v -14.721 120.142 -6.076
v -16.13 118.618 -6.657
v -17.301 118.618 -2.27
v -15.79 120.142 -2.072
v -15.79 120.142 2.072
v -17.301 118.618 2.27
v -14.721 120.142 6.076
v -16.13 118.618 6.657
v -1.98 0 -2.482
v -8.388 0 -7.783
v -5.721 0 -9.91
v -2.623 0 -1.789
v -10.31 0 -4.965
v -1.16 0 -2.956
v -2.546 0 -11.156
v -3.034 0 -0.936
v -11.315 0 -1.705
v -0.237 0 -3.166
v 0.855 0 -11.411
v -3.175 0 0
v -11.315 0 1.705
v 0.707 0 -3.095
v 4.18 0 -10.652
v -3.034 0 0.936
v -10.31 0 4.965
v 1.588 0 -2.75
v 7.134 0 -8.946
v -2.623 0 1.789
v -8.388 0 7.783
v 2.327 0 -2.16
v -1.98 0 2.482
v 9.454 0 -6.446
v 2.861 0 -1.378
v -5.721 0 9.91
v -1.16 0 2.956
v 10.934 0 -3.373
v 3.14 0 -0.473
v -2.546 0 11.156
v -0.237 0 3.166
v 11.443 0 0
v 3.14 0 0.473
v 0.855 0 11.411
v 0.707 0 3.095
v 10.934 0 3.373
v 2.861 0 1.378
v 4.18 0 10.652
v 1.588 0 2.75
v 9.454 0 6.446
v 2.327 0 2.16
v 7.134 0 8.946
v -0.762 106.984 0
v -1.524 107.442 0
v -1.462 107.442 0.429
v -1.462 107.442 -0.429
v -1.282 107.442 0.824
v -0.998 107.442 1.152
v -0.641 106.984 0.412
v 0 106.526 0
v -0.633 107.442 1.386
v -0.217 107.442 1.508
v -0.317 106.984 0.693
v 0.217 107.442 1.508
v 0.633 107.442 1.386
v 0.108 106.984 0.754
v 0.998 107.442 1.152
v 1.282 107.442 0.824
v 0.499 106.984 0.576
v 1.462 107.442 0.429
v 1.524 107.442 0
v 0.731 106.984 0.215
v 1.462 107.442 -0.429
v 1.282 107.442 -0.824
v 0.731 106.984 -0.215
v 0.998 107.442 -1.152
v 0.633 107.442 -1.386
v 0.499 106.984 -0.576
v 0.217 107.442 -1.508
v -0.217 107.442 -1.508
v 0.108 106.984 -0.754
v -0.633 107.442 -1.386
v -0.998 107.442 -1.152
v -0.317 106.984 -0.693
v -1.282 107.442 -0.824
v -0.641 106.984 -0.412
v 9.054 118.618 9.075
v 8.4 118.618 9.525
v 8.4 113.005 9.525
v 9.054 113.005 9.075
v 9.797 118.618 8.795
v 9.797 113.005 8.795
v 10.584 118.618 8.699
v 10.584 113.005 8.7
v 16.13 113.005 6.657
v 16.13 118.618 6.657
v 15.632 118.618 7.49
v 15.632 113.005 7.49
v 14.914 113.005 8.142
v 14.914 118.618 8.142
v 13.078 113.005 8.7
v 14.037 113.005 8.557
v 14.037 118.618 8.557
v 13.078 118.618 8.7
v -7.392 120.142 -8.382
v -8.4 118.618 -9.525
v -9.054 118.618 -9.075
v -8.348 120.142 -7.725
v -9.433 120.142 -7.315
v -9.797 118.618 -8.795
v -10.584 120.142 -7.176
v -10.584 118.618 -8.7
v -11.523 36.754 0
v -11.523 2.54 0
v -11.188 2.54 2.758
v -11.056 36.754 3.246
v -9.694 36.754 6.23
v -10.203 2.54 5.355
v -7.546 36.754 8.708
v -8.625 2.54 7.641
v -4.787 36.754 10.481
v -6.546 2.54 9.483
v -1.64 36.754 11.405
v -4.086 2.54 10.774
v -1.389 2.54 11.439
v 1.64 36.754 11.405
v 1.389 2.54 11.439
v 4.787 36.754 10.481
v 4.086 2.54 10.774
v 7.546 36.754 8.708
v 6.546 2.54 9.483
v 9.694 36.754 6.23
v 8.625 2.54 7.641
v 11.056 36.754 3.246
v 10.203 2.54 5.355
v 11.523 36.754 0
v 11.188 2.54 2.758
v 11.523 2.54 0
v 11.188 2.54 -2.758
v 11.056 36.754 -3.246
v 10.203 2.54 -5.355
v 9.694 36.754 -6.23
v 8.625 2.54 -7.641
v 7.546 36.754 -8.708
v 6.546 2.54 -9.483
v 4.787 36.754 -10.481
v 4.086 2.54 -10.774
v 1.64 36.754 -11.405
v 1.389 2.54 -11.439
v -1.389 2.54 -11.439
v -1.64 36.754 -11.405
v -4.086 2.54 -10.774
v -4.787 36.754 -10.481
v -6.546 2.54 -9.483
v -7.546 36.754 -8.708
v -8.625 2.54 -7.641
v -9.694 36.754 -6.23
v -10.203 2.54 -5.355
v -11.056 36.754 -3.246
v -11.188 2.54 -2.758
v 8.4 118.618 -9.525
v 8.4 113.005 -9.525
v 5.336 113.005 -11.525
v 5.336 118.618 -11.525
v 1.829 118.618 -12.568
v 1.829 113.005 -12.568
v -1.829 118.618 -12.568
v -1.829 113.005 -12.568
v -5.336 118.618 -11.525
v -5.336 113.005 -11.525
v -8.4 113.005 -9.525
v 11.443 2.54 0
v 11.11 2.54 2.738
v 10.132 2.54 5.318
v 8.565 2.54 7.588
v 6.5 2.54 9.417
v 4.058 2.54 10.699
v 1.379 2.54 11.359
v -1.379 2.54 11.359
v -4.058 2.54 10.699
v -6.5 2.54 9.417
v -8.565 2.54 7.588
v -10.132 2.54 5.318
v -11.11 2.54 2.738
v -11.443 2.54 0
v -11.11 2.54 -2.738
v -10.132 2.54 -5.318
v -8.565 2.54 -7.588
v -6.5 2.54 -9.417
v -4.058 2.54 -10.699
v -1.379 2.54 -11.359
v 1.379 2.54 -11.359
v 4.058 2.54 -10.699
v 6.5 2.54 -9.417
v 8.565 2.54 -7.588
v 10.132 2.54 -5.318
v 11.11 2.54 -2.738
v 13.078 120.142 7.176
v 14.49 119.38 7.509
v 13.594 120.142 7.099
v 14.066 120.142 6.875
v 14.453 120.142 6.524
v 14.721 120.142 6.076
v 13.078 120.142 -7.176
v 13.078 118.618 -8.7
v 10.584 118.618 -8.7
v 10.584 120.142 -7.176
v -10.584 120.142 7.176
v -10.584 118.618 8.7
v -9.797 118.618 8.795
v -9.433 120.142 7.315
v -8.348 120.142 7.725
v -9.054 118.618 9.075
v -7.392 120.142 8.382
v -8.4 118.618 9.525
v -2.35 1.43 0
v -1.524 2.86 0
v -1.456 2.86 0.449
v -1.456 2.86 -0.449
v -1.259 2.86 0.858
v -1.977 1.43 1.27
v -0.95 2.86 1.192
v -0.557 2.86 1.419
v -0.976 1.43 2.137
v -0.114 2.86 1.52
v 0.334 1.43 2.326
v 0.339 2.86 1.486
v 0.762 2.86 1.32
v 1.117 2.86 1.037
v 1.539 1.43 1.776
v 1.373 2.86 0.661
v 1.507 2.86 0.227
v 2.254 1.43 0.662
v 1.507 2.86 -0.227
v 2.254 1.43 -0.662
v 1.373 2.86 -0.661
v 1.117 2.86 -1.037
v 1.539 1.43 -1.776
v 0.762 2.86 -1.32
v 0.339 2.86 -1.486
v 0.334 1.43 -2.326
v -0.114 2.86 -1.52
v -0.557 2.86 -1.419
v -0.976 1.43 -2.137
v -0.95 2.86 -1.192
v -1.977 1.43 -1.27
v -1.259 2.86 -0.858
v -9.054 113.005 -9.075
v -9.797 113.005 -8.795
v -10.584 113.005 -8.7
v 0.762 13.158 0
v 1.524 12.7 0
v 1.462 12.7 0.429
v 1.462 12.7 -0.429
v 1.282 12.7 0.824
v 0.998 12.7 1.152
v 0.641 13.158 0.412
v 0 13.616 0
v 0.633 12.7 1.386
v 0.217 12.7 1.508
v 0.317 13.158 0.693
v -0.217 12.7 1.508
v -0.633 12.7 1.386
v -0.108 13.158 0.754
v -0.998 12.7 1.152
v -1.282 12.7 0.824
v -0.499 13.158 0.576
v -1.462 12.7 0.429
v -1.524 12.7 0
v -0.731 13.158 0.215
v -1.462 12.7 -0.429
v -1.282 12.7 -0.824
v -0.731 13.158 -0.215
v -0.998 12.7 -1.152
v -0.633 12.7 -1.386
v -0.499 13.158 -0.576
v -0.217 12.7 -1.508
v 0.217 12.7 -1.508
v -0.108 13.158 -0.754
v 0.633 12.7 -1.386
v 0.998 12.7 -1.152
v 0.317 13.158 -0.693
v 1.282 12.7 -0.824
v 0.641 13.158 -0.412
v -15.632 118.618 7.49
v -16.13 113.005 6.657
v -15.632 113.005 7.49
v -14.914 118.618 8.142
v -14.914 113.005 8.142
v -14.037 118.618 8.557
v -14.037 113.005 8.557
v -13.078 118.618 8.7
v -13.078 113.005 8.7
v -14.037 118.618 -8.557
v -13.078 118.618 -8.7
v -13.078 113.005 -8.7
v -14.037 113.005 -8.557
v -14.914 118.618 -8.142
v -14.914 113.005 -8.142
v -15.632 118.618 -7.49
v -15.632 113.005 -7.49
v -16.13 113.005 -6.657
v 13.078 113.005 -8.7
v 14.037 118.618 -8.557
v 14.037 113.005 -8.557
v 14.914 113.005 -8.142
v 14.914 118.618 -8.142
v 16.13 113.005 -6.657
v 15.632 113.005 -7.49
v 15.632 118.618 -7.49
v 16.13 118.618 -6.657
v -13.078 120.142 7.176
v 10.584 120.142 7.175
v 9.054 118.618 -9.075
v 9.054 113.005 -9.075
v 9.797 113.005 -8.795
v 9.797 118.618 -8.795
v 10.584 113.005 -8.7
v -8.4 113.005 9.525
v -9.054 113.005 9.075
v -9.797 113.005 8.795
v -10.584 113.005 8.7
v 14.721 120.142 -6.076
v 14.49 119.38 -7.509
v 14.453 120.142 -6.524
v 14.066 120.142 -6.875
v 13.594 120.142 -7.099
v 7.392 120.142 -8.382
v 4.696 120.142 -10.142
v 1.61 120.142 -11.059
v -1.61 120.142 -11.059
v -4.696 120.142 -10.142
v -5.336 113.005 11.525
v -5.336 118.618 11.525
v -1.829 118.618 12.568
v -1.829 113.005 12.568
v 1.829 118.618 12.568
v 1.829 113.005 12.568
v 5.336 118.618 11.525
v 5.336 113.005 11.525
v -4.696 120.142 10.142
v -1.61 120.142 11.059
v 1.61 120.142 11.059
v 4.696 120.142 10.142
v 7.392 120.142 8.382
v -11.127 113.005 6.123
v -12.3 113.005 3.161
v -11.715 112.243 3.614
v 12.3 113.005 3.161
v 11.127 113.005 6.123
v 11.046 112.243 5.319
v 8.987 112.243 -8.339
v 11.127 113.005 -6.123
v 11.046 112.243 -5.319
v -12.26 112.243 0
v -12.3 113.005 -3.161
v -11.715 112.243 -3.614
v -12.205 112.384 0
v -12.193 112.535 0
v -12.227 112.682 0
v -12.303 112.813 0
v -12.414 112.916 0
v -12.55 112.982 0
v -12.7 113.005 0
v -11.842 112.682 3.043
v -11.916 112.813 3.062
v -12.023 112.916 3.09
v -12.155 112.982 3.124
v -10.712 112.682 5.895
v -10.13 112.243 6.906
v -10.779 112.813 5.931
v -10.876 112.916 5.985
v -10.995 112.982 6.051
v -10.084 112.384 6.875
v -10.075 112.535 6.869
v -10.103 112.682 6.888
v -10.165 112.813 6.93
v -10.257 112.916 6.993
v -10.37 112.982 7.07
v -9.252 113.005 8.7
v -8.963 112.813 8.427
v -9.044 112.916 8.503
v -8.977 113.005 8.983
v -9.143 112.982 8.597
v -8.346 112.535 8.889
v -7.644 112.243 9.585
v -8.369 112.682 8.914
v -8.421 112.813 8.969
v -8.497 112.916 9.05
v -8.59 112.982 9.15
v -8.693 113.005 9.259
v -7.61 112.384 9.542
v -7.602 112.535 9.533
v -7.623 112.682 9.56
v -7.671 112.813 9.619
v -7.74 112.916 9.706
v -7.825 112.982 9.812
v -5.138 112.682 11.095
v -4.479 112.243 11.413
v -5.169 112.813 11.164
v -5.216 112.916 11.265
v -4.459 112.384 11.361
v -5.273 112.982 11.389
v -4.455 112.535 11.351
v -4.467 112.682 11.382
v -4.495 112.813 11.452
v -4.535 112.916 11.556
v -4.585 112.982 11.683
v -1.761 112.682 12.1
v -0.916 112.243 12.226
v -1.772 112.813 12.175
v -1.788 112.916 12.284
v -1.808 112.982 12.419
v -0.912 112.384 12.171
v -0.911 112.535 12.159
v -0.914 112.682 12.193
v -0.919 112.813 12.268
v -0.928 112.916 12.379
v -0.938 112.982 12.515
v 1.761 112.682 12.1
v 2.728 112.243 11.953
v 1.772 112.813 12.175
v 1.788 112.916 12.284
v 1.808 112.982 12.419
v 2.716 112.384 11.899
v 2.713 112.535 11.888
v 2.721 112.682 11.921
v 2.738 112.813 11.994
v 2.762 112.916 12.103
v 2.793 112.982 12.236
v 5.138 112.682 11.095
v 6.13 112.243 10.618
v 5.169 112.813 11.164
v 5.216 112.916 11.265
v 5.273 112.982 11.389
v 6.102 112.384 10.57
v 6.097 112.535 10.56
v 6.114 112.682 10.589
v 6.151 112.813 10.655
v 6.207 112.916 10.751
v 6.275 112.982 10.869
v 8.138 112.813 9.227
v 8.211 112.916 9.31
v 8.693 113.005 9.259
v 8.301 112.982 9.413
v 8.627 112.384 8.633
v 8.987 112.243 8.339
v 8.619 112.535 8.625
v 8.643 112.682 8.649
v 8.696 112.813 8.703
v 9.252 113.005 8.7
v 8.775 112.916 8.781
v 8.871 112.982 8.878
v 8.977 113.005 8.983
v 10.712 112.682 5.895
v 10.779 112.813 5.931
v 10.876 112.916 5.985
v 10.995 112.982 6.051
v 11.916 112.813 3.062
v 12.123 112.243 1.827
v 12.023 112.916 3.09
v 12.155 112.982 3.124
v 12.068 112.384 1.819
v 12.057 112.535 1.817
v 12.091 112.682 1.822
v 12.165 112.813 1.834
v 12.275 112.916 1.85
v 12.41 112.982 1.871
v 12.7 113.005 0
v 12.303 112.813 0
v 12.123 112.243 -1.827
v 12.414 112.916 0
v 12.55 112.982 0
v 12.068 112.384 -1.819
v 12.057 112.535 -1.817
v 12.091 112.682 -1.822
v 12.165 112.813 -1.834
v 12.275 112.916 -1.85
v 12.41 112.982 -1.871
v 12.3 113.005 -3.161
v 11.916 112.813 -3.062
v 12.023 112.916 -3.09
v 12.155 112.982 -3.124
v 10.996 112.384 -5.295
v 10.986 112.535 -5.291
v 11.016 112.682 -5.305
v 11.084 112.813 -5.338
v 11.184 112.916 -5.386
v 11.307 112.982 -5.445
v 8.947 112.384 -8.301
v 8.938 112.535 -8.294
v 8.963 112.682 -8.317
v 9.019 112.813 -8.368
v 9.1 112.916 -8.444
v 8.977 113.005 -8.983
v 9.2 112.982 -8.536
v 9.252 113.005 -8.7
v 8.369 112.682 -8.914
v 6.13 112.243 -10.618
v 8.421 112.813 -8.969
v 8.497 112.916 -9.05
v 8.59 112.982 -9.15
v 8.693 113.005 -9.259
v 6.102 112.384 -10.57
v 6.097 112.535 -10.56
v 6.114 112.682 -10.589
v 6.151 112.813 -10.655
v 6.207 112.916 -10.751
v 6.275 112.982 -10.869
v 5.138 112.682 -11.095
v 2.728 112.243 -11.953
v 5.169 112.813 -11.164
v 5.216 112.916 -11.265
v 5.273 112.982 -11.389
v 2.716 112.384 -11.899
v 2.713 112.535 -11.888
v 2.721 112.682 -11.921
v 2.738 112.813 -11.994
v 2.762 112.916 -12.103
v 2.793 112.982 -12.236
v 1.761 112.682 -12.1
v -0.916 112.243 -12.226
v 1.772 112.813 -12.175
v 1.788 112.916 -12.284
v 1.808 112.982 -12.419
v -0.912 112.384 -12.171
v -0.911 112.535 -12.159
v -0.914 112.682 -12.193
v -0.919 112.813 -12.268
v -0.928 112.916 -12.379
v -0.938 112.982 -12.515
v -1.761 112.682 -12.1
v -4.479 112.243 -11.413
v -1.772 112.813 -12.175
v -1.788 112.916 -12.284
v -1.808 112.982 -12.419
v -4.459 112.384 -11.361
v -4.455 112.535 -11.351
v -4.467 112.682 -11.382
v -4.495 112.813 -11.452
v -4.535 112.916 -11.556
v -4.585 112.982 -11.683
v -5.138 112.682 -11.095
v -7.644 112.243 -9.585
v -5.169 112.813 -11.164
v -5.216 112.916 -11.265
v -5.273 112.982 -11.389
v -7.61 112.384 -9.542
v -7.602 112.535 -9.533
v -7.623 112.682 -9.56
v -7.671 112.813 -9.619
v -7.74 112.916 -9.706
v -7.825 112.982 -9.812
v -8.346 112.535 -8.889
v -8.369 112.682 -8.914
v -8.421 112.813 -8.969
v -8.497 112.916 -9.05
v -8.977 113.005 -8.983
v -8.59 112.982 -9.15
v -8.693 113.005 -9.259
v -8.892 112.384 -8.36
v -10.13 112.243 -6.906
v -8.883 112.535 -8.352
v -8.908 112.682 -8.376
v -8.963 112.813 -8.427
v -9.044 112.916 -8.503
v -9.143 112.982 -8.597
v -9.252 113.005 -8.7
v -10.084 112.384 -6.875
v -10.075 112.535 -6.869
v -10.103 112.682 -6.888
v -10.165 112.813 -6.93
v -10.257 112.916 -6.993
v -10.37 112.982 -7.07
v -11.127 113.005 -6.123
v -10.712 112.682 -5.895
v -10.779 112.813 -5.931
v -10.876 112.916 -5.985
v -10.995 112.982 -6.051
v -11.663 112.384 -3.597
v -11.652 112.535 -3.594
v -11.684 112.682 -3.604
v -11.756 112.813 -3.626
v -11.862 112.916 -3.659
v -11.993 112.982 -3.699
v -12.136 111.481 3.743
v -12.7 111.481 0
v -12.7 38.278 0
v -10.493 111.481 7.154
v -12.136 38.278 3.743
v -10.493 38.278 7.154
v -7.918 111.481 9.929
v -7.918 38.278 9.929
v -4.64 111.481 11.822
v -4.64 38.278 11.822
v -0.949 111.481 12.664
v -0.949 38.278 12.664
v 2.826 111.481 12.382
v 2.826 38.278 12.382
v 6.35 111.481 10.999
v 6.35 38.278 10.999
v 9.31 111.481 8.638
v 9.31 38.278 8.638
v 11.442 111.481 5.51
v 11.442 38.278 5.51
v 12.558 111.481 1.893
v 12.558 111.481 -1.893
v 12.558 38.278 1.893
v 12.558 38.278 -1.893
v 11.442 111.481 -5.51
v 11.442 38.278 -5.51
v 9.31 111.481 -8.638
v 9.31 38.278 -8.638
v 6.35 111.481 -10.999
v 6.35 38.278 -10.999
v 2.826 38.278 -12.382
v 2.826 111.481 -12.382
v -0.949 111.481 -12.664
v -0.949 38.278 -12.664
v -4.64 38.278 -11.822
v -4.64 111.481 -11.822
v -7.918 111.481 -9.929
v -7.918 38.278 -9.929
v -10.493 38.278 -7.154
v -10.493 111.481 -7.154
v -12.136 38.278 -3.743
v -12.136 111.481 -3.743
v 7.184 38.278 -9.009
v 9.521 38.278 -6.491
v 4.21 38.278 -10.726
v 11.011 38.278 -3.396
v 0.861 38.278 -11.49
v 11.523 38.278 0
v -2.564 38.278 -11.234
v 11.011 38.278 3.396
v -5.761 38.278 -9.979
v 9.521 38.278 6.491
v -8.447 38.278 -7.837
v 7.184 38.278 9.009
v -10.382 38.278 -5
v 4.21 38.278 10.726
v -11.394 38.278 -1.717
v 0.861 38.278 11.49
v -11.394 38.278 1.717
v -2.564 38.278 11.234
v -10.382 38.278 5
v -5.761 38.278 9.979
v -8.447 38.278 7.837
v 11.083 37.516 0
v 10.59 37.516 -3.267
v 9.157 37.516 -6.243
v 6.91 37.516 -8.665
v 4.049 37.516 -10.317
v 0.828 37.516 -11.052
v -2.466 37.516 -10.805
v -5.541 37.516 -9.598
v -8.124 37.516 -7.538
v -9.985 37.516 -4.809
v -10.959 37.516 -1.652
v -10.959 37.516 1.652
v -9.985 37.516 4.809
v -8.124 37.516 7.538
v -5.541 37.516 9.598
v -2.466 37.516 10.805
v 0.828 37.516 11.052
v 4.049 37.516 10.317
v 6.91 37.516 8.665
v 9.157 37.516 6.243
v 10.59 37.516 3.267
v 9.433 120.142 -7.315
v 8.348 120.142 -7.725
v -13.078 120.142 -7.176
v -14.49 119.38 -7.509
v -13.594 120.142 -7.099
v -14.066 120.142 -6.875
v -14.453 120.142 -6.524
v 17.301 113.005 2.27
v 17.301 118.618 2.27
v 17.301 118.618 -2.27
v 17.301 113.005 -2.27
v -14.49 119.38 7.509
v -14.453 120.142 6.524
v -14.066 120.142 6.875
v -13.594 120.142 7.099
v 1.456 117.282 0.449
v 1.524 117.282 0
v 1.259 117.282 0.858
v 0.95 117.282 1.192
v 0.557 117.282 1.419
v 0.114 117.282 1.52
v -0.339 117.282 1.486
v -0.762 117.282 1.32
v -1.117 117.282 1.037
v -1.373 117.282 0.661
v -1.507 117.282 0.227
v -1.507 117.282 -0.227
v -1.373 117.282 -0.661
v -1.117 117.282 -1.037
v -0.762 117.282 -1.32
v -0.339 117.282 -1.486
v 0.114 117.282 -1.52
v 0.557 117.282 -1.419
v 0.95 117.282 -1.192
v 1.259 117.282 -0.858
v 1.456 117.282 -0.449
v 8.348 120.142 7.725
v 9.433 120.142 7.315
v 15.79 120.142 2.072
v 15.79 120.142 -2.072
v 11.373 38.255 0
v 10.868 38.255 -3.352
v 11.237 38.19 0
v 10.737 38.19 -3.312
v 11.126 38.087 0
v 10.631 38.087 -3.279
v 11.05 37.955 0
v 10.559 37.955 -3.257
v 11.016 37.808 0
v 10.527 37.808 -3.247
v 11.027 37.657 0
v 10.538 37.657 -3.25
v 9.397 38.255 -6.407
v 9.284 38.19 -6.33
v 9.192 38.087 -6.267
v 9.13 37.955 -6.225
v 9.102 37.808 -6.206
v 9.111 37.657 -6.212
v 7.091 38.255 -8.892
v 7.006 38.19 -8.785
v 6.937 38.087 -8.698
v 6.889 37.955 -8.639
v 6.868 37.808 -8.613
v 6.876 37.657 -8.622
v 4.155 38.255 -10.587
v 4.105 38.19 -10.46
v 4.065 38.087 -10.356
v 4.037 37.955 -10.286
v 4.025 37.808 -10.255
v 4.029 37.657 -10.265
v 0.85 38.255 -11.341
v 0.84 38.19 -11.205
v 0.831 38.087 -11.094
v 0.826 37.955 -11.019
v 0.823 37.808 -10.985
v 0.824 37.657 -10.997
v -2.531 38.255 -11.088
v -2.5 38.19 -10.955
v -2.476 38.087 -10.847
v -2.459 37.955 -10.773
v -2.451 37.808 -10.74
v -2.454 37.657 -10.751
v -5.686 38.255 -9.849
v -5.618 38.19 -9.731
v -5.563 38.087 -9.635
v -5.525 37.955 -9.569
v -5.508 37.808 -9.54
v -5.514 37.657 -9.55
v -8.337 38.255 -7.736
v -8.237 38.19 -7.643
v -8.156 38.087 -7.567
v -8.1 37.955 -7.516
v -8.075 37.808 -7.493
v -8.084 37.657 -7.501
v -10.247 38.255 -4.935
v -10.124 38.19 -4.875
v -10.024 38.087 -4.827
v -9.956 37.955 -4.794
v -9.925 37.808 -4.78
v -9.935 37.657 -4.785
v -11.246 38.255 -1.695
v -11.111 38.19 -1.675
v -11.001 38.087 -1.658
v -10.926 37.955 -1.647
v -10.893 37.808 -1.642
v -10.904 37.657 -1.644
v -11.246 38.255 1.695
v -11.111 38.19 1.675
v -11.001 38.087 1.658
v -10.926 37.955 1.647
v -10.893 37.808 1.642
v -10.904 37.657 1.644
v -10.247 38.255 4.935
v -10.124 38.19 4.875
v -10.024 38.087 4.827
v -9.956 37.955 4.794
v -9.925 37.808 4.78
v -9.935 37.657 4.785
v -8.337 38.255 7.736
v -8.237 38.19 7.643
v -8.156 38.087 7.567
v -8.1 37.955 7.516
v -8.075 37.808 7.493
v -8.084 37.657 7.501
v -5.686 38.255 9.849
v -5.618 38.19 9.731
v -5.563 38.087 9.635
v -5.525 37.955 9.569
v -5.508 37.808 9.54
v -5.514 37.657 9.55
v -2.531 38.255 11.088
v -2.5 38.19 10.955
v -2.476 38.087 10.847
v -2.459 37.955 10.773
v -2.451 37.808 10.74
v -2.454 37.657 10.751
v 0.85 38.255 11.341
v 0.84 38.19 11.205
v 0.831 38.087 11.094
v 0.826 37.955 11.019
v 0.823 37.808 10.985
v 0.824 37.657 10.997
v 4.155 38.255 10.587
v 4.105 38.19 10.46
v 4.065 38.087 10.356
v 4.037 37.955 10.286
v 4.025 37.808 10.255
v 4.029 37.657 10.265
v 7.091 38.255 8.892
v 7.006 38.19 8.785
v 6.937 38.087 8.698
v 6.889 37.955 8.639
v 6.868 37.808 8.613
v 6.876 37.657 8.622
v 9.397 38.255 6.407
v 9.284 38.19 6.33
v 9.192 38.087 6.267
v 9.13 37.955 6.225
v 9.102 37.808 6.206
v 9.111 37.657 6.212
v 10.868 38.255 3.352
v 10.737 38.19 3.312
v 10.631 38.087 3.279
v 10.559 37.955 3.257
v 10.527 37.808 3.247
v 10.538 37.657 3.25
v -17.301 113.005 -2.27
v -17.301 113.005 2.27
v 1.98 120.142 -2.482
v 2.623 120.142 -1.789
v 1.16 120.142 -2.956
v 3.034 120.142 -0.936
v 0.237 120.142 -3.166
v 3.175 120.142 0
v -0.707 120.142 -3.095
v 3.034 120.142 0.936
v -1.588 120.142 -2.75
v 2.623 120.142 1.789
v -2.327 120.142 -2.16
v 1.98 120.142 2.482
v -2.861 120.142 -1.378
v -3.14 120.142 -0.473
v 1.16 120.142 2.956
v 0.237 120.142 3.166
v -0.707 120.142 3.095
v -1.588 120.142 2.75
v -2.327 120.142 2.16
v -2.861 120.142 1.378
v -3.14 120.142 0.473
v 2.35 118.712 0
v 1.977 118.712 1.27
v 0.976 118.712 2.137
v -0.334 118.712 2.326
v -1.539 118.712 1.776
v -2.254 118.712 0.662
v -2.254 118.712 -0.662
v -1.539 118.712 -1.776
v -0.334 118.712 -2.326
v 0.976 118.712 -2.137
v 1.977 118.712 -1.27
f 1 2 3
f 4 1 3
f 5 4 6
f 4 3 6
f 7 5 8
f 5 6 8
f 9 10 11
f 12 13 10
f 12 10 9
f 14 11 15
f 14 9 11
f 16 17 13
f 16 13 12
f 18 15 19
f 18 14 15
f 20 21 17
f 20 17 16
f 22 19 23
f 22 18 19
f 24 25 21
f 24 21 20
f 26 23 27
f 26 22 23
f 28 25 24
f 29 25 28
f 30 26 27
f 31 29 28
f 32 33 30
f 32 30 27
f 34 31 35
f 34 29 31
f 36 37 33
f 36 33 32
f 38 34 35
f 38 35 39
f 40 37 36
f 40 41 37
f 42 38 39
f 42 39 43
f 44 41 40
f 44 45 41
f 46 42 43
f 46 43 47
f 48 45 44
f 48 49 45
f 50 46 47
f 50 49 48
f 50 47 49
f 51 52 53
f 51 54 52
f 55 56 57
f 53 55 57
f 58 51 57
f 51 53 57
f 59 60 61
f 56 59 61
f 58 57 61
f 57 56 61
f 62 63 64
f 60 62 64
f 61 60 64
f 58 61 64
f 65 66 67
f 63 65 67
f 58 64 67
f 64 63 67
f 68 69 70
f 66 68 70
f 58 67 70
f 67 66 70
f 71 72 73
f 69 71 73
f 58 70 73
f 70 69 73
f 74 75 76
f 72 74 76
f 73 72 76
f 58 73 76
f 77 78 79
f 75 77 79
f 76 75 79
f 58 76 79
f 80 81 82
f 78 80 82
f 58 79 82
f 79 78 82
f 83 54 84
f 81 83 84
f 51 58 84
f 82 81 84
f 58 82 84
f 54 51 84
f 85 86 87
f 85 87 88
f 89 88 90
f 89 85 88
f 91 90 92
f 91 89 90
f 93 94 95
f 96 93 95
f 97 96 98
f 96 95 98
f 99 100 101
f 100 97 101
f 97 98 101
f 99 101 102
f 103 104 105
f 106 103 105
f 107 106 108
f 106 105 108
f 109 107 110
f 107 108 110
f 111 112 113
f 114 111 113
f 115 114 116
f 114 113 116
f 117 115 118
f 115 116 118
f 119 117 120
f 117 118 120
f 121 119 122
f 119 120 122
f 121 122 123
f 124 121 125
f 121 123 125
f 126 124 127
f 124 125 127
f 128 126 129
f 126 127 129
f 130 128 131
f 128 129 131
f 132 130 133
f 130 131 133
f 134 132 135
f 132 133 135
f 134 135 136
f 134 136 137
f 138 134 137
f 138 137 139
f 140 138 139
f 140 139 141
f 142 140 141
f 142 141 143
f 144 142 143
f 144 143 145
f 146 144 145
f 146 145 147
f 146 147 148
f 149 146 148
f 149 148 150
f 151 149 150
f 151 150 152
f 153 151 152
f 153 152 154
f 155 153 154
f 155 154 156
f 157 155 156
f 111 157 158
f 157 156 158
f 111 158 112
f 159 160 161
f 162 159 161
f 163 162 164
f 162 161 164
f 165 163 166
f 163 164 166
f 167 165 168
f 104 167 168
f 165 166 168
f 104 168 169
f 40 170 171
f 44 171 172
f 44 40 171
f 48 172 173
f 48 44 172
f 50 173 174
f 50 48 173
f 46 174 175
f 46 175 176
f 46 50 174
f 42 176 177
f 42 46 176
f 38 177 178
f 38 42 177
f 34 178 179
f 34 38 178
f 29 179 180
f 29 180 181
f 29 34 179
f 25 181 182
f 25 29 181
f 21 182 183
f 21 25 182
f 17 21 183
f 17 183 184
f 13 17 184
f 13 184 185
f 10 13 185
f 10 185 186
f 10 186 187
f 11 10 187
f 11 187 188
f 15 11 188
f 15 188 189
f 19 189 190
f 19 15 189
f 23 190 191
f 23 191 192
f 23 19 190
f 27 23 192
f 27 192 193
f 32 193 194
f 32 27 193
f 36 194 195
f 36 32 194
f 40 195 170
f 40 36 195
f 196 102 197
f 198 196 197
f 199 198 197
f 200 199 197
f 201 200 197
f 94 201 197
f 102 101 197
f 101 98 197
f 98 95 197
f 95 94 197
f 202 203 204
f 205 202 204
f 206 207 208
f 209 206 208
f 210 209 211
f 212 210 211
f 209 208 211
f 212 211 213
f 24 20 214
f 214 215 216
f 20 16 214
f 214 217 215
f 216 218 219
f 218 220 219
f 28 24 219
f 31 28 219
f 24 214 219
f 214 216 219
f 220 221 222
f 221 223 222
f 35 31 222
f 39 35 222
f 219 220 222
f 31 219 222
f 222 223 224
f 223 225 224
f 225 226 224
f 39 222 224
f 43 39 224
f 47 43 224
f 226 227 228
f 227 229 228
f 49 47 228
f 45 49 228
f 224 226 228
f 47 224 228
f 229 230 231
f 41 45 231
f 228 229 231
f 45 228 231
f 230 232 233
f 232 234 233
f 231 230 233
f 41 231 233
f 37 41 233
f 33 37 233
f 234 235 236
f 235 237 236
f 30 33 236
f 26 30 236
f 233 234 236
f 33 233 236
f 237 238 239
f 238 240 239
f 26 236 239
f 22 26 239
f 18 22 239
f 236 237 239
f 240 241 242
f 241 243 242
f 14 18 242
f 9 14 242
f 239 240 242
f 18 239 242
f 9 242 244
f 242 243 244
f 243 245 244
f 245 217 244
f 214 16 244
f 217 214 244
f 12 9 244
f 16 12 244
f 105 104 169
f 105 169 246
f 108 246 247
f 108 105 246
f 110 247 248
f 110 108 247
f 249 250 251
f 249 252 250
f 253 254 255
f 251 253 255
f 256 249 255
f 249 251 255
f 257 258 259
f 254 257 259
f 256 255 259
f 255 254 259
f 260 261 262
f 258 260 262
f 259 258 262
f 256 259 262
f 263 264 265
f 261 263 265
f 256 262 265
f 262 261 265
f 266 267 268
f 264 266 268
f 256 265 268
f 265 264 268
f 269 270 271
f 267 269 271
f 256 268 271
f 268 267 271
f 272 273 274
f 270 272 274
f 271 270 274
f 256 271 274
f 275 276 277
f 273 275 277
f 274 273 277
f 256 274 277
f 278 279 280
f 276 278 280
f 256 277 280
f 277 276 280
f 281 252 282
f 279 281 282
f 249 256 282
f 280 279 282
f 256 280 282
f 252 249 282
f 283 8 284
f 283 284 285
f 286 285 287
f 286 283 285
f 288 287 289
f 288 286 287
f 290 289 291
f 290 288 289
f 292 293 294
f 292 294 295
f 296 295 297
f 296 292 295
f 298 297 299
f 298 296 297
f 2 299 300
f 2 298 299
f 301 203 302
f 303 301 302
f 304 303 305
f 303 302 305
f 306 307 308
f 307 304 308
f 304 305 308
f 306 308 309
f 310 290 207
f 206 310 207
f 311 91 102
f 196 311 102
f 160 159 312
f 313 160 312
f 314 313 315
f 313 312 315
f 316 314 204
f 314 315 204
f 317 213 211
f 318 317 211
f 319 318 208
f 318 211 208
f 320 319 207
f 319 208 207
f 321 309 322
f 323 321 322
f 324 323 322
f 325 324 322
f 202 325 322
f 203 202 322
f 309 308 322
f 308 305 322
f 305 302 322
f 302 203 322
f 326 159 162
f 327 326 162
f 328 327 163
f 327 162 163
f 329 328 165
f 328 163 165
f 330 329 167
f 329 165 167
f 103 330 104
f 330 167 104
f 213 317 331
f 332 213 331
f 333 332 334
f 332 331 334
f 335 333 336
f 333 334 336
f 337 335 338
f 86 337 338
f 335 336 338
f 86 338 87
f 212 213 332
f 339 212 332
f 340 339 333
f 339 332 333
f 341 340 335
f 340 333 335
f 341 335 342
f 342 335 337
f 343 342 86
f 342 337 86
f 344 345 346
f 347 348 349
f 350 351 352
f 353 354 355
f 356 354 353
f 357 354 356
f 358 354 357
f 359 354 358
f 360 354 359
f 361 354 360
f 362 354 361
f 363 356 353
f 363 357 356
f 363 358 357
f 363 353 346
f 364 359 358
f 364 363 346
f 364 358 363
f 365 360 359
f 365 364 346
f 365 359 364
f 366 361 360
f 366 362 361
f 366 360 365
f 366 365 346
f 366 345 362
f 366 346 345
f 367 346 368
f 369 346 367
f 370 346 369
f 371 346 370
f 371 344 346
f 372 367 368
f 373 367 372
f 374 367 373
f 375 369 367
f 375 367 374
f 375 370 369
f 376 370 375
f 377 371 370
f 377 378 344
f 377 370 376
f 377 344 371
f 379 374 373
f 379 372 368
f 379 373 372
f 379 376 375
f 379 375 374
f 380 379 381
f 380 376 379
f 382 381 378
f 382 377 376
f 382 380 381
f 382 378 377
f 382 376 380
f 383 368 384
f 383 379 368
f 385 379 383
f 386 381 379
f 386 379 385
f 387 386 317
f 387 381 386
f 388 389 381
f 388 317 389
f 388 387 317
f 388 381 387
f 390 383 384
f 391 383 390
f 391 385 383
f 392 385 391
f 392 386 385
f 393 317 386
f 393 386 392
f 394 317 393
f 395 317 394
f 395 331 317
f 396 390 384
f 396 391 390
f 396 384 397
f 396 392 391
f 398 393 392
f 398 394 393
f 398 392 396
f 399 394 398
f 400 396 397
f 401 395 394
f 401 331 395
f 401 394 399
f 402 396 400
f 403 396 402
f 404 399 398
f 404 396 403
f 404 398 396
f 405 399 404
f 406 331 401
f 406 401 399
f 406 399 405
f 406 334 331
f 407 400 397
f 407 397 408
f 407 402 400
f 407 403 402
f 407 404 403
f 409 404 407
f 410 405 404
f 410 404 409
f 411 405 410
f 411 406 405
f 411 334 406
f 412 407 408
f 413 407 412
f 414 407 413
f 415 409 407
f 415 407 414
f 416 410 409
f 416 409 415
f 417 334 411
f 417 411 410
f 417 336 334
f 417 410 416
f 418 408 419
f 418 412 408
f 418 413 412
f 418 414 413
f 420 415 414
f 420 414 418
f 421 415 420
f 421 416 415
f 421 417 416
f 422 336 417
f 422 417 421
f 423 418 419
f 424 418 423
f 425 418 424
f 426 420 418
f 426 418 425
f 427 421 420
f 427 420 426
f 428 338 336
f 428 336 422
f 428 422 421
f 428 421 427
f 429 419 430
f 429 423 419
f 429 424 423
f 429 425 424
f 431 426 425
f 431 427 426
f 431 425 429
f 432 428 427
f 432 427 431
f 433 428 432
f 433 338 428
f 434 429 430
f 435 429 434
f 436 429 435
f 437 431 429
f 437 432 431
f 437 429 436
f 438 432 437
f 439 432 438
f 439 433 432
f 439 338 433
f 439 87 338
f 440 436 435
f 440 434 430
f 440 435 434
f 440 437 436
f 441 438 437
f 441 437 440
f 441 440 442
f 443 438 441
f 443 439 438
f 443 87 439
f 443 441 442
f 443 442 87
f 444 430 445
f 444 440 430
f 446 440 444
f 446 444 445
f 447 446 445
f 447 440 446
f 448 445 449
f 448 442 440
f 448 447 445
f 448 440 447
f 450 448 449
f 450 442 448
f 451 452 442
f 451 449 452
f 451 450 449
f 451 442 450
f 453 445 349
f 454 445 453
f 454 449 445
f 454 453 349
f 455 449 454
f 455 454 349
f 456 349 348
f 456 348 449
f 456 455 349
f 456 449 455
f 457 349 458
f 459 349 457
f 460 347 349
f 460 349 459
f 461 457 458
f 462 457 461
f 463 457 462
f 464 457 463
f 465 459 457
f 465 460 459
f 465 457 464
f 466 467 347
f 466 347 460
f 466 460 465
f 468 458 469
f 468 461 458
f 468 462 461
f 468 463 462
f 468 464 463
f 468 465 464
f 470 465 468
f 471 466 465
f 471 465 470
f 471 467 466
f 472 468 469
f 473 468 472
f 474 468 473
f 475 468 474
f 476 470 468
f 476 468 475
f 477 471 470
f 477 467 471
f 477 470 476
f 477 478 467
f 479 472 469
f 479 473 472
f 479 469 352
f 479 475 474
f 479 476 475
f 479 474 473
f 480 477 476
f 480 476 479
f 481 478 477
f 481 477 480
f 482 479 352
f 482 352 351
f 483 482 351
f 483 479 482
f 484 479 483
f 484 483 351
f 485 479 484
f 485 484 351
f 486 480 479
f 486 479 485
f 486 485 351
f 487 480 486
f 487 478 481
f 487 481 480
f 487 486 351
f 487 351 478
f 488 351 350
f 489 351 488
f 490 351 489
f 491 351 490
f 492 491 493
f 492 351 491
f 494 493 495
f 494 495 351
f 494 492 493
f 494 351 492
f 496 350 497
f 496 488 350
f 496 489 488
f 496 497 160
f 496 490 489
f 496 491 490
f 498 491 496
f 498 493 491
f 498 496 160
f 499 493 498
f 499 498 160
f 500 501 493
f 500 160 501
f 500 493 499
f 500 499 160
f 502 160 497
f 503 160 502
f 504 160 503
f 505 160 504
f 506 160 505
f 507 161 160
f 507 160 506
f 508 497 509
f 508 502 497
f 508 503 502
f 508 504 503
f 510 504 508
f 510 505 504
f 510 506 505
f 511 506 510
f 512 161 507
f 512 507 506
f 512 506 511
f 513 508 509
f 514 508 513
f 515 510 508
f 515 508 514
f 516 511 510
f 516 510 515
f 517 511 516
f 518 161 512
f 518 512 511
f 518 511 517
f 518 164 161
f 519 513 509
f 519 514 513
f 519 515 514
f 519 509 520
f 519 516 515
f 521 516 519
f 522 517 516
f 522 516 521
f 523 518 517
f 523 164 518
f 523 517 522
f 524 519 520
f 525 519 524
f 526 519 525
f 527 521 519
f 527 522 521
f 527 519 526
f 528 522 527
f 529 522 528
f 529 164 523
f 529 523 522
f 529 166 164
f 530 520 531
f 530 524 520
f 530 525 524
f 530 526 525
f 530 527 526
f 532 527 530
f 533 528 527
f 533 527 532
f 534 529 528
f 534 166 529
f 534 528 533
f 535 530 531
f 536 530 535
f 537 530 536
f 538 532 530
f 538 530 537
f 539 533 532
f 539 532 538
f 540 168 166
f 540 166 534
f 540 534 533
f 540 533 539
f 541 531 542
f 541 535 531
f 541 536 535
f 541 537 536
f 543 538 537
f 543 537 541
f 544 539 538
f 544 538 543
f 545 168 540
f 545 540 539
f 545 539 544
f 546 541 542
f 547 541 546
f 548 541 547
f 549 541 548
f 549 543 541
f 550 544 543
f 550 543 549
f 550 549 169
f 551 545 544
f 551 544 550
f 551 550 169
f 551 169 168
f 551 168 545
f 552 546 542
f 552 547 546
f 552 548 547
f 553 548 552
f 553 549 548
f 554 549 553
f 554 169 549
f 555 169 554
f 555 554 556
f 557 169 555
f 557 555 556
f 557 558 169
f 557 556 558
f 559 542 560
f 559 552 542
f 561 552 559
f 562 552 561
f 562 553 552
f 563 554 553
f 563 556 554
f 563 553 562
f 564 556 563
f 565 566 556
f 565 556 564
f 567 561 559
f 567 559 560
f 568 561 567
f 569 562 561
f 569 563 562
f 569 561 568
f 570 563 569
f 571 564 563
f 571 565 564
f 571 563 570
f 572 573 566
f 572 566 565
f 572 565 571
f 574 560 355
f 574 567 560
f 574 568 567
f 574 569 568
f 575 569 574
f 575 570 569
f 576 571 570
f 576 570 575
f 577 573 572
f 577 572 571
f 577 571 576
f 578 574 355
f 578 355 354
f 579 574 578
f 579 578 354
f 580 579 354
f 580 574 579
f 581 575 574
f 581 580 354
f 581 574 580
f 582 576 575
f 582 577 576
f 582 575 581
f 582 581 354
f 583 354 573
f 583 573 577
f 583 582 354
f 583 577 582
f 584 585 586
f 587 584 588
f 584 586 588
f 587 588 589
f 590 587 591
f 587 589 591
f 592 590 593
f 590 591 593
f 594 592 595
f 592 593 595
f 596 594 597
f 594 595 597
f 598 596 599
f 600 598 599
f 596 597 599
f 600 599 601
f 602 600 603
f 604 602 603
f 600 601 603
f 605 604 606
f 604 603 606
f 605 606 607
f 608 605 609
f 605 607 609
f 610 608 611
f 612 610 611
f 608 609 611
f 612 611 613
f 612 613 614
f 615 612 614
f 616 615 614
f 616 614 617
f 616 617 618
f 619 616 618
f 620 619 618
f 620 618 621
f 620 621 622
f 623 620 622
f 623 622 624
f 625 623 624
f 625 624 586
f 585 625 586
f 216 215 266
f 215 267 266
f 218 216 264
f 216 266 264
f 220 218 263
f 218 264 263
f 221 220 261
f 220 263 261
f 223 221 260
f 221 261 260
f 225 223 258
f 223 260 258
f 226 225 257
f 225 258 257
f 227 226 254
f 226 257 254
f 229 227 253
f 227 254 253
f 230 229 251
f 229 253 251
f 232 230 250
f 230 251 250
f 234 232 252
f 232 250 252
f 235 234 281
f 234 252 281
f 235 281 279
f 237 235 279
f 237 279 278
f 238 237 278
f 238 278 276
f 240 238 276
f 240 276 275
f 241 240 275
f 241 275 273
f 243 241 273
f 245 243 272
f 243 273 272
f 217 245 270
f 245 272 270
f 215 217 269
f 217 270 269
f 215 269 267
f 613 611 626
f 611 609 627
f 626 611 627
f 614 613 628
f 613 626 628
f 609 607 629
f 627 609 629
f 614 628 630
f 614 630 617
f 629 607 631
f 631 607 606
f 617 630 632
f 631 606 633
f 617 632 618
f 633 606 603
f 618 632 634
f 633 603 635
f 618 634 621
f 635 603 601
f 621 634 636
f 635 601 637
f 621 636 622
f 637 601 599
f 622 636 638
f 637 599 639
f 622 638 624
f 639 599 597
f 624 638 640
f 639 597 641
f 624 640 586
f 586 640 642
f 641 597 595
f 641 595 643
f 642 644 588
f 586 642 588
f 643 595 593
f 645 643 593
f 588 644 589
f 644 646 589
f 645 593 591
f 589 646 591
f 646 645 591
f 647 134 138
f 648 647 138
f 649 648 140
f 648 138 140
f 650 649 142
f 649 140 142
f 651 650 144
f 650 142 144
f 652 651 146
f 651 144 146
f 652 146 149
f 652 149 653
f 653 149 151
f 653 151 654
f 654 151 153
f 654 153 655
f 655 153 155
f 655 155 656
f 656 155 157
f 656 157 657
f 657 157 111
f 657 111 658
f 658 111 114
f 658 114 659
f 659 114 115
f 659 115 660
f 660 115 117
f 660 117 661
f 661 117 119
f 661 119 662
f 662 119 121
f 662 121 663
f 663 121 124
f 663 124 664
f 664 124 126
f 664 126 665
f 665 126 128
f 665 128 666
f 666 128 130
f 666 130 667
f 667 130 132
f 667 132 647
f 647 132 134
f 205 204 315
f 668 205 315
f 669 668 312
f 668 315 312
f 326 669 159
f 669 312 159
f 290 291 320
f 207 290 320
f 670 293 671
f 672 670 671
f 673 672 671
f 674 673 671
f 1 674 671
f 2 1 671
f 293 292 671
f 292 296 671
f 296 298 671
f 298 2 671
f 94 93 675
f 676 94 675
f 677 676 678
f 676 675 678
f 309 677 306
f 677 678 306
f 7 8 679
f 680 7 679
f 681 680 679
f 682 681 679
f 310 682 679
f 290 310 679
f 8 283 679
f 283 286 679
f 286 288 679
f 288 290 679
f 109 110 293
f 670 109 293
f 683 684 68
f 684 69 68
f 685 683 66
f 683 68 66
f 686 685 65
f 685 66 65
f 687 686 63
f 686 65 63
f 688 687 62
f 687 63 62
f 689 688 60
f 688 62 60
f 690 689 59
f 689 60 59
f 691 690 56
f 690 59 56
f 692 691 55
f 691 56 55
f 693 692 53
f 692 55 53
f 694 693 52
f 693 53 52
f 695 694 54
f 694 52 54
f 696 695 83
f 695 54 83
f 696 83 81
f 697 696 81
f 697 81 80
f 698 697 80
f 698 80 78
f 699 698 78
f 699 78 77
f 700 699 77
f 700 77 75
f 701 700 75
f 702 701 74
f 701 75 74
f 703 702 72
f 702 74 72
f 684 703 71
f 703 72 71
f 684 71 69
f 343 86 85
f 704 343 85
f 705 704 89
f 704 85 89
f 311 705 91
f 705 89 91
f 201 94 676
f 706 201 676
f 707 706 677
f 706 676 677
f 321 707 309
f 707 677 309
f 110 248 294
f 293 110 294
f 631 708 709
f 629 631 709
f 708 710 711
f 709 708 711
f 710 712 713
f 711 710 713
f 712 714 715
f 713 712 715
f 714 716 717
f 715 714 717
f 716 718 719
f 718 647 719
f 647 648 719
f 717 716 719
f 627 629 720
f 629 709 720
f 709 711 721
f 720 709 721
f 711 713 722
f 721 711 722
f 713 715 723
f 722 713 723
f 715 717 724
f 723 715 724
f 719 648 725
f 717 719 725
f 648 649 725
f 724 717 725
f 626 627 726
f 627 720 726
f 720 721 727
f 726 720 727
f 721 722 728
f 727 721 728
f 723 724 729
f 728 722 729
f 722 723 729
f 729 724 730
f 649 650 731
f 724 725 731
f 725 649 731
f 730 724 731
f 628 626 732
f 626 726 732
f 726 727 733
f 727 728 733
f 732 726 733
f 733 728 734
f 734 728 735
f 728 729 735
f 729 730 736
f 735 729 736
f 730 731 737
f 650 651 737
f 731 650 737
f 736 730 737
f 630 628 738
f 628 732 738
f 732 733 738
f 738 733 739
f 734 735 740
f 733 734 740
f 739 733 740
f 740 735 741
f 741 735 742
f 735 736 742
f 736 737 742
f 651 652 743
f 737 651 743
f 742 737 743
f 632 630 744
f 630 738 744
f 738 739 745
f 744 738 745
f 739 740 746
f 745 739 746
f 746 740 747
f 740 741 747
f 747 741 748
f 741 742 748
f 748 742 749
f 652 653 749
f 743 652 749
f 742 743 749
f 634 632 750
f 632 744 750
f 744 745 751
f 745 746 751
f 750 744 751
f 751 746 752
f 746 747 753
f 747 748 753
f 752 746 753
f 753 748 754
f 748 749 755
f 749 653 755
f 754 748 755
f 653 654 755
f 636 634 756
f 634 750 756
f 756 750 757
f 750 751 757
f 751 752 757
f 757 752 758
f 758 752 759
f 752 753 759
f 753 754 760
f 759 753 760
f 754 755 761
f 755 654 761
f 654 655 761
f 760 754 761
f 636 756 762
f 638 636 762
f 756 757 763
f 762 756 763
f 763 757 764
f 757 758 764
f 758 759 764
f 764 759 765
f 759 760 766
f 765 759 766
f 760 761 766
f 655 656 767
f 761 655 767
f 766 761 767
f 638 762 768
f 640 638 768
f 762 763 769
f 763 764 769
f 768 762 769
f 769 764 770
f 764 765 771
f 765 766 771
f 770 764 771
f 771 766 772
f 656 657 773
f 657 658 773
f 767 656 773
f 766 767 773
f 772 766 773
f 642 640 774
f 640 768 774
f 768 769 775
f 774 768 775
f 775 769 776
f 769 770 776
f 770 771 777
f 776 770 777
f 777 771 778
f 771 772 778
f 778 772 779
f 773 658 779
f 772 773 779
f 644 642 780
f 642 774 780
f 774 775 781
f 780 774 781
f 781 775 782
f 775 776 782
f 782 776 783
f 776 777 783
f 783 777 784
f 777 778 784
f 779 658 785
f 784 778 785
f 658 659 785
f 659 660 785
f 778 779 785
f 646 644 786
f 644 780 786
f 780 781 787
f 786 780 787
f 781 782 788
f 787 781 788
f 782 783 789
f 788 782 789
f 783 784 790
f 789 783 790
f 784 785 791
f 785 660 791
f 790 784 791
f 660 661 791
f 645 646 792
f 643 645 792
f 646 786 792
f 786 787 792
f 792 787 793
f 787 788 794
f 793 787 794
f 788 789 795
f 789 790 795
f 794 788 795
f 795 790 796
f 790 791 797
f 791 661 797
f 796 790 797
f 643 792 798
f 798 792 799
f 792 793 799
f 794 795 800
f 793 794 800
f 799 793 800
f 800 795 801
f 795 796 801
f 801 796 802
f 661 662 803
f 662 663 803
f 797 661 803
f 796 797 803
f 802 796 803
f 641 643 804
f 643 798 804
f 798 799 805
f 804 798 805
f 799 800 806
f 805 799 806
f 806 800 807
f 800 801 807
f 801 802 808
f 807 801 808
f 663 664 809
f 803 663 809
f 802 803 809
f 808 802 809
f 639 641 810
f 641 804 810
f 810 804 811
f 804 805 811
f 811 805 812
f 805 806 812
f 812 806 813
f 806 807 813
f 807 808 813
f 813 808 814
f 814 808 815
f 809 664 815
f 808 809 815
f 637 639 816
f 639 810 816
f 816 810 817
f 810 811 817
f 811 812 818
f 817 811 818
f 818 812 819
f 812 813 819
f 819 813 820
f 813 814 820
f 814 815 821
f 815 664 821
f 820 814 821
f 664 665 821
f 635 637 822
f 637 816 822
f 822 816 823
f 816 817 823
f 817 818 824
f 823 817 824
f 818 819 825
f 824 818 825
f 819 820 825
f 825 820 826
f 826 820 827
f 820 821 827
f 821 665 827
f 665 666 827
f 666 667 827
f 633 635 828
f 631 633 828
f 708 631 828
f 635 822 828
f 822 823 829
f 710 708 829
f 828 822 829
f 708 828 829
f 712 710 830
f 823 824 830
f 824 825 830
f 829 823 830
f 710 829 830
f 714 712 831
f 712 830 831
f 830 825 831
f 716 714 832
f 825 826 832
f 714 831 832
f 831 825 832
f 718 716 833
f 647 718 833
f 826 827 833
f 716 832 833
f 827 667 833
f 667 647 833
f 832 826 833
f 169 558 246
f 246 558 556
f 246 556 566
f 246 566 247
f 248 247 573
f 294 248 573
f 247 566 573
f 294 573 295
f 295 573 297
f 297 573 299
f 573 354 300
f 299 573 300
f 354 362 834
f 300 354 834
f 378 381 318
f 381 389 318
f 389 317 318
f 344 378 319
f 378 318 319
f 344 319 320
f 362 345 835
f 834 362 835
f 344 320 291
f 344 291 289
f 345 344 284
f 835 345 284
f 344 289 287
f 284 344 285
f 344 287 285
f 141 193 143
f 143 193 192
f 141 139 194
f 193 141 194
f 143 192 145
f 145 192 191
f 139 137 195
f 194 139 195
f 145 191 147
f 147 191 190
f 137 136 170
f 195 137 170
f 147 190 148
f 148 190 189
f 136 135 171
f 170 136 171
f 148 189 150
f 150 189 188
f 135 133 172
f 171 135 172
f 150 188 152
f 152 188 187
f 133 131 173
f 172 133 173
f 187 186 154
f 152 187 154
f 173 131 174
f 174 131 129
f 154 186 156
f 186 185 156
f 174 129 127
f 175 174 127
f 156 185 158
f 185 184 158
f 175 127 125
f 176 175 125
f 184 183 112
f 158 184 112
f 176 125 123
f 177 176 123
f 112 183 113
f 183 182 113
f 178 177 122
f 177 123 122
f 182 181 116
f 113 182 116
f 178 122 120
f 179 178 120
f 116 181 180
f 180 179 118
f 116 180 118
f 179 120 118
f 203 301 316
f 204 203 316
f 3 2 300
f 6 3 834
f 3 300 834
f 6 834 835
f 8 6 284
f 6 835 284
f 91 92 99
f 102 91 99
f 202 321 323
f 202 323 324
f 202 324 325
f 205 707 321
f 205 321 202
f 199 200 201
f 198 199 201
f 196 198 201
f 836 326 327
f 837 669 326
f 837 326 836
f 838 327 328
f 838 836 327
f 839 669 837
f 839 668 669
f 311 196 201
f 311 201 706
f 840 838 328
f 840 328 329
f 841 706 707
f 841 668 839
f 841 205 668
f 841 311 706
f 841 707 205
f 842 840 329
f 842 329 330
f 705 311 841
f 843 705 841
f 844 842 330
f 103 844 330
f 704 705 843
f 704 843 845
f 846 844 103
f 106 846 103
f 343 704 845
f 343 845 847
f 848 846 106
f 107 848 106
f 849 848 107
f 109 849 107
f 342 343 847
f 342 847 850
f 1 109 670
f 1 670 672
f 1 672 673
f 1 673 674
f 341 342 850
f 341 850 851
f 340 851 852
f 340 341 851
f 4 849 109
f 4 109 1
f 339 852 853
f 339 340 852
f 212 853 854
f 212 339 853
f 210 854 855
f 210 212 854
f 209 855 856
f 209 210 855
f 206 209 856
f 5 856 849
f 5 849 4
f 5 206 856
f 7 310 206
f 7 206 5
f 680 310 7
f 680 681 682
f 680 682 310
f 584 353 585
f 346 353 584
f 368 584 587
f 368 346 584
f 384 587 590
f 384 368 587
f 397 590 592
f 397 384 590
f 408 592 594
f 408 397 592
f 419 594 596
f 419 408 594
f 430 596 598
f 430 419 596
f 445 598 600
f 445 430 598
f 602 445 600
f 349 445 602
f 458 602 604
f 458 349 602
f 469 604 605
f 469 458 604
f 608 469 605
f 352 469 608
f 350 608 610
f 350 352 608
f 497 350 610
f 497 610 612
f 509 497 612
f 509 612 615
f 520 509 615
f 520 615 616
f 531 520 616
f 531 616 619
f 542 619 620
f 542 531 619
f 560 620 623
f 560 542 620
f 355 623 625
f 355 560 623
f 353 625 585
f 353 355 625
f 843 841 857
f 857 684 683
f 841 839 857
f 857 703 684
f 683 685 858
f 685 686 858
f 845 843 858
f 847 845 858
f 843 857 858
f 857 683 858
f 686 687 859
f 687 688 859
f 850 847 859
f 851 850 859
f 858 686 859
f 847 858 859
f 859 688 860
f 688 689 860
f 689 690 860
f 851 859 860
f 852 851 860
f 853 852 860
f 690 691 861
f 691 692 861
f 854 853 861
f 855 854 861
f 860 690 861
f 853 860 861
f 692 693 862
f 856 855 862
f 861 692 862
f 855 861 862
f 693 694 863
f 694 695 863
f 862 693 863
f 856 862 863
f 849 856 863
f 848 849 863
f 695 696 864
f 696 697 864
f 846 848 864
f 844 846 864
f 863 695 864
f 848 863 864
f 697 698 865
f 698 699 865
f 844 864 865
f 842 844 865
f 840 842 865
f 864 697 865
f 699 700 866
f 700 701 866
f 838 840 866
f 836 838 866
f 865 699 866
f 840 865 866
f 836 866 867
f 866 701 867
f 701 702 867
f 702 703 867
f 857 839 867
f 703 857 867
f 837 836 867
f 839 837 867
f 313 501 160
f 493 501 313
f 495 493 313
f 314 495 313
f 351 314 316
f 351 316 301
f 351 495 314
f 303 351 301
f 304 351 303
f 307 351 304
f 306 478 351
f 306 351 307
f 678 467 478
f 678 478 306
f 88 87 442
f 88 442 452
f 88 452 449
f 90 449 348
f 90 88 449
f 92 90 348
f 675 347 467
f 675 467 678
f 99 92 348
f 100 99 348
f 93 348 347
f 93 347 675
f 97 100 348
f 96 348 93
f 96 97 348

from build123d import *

# Parameters (mm, degrees)
F0_R            = 11.4427
F1_DEPTH        = 2.54
F2_R            = 11.52271
F3_DEPTH        = 35.7378
F4_R            = 12.7
F4_R_2          = 11.52271
F5_DEPTH        = 74.7268
F7_DEPTH        = 7.1374
F8_T1_DEPTH     = 7.1374
F8_T3_DEPTH     = 18.5145836873
F9_SIZE         = 1.524
F13_D           = 3.048
F13_DEPTH       = 12.7
F13_CSINK_D     = 6.35
F13_CSINK_ANGLE = 60
F13_TIP         = 0.9157115834
F15_D           = 3.048
F15_DEPTH       = 12.7
F15_CSINK_D     = 6.35
F15_CSINK_ANGLE = 60
F15_TIP         = 0.9157115834


# Not quite as in the source:
# - a fillet or chamfer that OpenCascade refuses, or shapes differently, is made with other operations: its cross-section is extruded or revolved along the edge and cut away or added


with BuildPart() as f1:
    # F0 (on Front) → F1 (new body)
    with BuildSketch(Plane.XZ):
        Circle(F0_R)
    extrude(amount=-F1_DEPTH)

    # F2 (on face) → F3 (join)
    with BuildSketch(Plane(origin=(0, 2.54, 0), x_dir=(-1, 0, 0), z_dir=(0, 1, 0))):
        Circle(F2_R)
    extrude(amount=F3_DEPTH)

    # F4 (on face) → F5 (join)
    with BuildSketch(Plane(origin=(0, 38.2778, 0), x_dir=(-1, 0, 0), z_dir=(0, 1, 0))):
        Circle(F4_R)
        Circle(F4_R_2, mode=Mode.SUBTRACT)
        Circle(F4_R_2)
    extrude(amount=F5_DEPTH)

    # F6 (on face) → F7 (join)
    with BuildSketch(Plane(origin=(0, 113.0046, 0), x_dir=(-1, 0, 0), z_dir=(0, 1, 0))):
        with BuildLine():
            ThreePointArc((12.7, 0), (11.8067080769, 4.678850755), (9.2524969468, 8.6995))
            ThreePointArc((9.2524969468, 8.6995), (0, 12.7), (-9.2524969468, 8.6995))
            ThreePointArc((-9.2524969468, 8.6995), (-12.7, 0), (-9.2524969468, -8.6995))
            ThreePointArc((-9.2524969468, -8.6995), (0, -12.7), (9.2524969468, -8.6995))
            ThreePointArc((9.2524969468, -8.6995), (11.8067080769, -4.678850755), (12.7, 0))
        make_face()
        with BuildLine():
            ThreePointArc((15.126606354, -8.6995), (17.4498, 0), (15.126606354, 8.6995))
            Line((15.126606354, 8.6995), (9.2524969468, 8.6995))
            ThreePointArc((9.2524969468, 8.6995), (11.8067080769, 4.678850755), (12.7, 0))
            ThreePointArc((12.7, 0), (11.8067080769, -4.678850755), (9.2524969468, -8.6995))
            Line((9.2524969468, -8.6995), (15.126606354, -8.6995))
        make_face()
        with BuildLine():
            ThreePointArc((-9.2524969468, -8.6995), (-12.7, 0), (-9.2524969468, 8.6995))
            Line((-9.2524969468, 8.6995), (-15.126606354, 8.6995))
            ThreePointArc((-15.126606354, 8.6995), (-17.4498, 0), (-15.126606354, -8.6995))
            Line((-15.126606354, -8.6995), (-9.2524969468, -8.6995))
        make_face()
    extrude(amount=F7_DEPTH)

    # F8: fillet of radius 3.302 on 8 edges, made by hand

    # F8_s2 → F8_t1 (join)
    with BuildSketch(Plane.XZ.offset(-120.142)):
        with BuildLine():
            ThreePointArc((-8.4002604126, -9.525), (-9.4168948242, -8.9127618272), (-10.5843281199, -8.6995))
            Line((-10.5843281199, -8.6995), (-9.2524969468, -8.6995))
            ThreePointArc((-9.2524969468, -8.6995), (-8.8360241715, -9.1222078928), (-8.4002604126, -9.525))
        make_face()
        with BuildLine():
            ThreePointArc((8.4002604126, -9.525), (9.4168948242, -8.9127618272), (10.5843281199, -8.6995))
            Line((10.5843281199, -8.6995), (9.2524969468, -8.6995))
            ThreePointArc((9.2524969468, -8.6995), (8.8360241715, -9.1222078928), (8.4002604126, -9.525))
        make_face()
        with BuildLine():
            ThreePointArc((-8.4002604126, 9.525), (-9.4168948242, 8.9127618272), (-10.5843281199, 8.6995))
            Line((-10.5843281199, 8.6995), (-9.2524969468, 8.6995))
            ThreePointArc((-9.2524969468, 8.6995), (-8.8360241715, 9.1222078928), (-8.4002604126, 9.525))
        make_face()
        with BuildLine():
            ThreePointArc((8.4002604126, 9.525), (9.4168948242, 8.9127618272), (10.5843281199, 8.6995))
            Line((10.5843281199, 8.6995), (9.2524969468, 8.6995))
            ThreePointArc((9.2524969468, 8.6995), (8.8360241715, 9.1222078928), (8.4002604126, 9.525))
        make_face()
    extrude(amount=F8_T1_DEPTH)

    # F8_s4 → F8_t3 (cut)
    with BuildSketch(Plane.XZ.offset(-125.8305918437)):
        with BuildLine():
            ThreePointArc((-13.0777382827, -8.6995), (-14.913976773, -8.1418454969), (-16.1299931781, -6.6572396768))
            ThreePointArc((-16.1299931781, -6.6572396768), (-15.6616238106, -7.6947423385), (-15.126606354, -8.6995))
            Line((-15.126606354, -8.6995), (-13.0777382827, -8.6995))
        make_face()
        with BuildLine():
            ThreePointArc((13.0777382827, -8.6995), (14.913976773, -8.1418454969), (16.1299931781, -6.6572396768))
            ThreePointArc((16.1299931781, -6.6572396768), (15.6616238106, -7.6947423385), (15.126606354, -8.6995))
            Line((15.126606354, -8.6995), (13.0777382827, -8.6995))
        make_face()
        with BuildLine():
            ThreePointArc((-16.1299931781, 6.6572396768), (-14.913976773, 8.1418454969), (-13.0777382827, 8.6995))
            Line((-13.0777382827, 8.6995), (-15.126606354, 8.6995))
            ThreePointArc((-15.126606354, 8.6995), (-15.6616238106, 7.6947423385), (-16.1299931781, 6.6572396768))
        make_face()
        with BuildLine():
            ThreePointArc((16.1299931781, 6.6572396768), (14.913976773, 8.1418454969), (13.0777382827, 8.6995))
            Line((13.0777382827, 8.6995), (15.126606354, 8.6995))
            ThreePointArc((15.126606354, 8.6995), (15.6616238106, 7.6947423385), (16.1299931781, 6.6572396768))
        make_face()
    extrude(amount=F8_T3_DEPTH, mode=Mode.SUBTRACT)

    # F9
    f9_edges = [f1.edges().sort_by_distance(p)[0] for p in [
        (0, 120.142, 12.7),
        (0, 120.142, -12.7),
        (-9.416895, 120.142, -8.912762),
        (9.416895, 120.142, -8.912762),
        (11.831033, 120.142, -8.6995),
        (14.913977, 120.142, -8.141845),
        (17.4498, 120.142, 0),
        (14.913977, 120.142, 8.141845),
        (11.831033, 120.142, 8.6995),
        (9.416895, 120.142, 8.912762),
        (-9.416895, 120.142, 8.912762),
        (-11.831033, 120.142, 8.6995),
        (-14.913977, 120.142, 8.141845),
        (-17.4498, 120.142, 0),
        (-14.913977, 120.142, -8.141845),
        (-11.831033, 120.142, -8.6995),
    ]]
    chamfer(f9_edges, length=F9_SIZE)

    # F10 (on Top) → F11 (revolve, cut)
    with BuildSketch(Plane.XY):
        with BuildLine():
            Line((-12.7, 113.0046), (-12.7, 111.4806))
            Line((-12.7, 111.4806), (-12.2600590949, 112.2426))
            ThreePointArc((-12.2600590949, 112.2426), (-12.2600590949, 112.7506), (-12.7, 113.0046))
        make_face()
        with BuildLine():
            Line((11.52271, 36.7538), (11.52271, 38.2778))
            ThreePointArc((11.52271, 38.2778), (11.0827690949, 38.0238), (11.0827690949, 37.5158))
            Line((11.0827690949, 37.5158), (11.52271, 36.7538))
        make_face()
    revolve(axis=Axis((0, 32.0415347815, 0), (0, 1, 0)), mode=Mode.SUBTRACT)

    # F13
    with Locations(Plane.XZ):
        with Locations((0, 0)):
            CounterSinkHole(F13_D / 2, F13_CSINK_D / 2, depth=F13_DEPTH, counter_sink_angle=F13_CSINK_ANGLE)
            with Locations((0, 0, -(F13_DEPTH + F13_TIP / 2))):  # 118° drill point
                Cone(0, F13_D / 2, F13_TIP, mode=Mode.SUBTRACT)

    # F15
    with Locations(Plane(origin=(0, 120.142, 0), x_dir=(-1, 0, 0), z_dir=(0, 1, 0))):
        with Locations((0, 0)):
            CounterSinkHole(F15_D / 2, F15_CSINK_D / 2, depth=F15_DEPTH, counter_sink_angle=F15_CSINK_ANGLE)
            with Locations((0, 0, -(F15_DEPTH + F15_TIP / 2))):  # 118° drill point
                Cone(0, F15_D / 2, F15_TIP, mode=Mode.SUBTRACT)


solid = f1.part
